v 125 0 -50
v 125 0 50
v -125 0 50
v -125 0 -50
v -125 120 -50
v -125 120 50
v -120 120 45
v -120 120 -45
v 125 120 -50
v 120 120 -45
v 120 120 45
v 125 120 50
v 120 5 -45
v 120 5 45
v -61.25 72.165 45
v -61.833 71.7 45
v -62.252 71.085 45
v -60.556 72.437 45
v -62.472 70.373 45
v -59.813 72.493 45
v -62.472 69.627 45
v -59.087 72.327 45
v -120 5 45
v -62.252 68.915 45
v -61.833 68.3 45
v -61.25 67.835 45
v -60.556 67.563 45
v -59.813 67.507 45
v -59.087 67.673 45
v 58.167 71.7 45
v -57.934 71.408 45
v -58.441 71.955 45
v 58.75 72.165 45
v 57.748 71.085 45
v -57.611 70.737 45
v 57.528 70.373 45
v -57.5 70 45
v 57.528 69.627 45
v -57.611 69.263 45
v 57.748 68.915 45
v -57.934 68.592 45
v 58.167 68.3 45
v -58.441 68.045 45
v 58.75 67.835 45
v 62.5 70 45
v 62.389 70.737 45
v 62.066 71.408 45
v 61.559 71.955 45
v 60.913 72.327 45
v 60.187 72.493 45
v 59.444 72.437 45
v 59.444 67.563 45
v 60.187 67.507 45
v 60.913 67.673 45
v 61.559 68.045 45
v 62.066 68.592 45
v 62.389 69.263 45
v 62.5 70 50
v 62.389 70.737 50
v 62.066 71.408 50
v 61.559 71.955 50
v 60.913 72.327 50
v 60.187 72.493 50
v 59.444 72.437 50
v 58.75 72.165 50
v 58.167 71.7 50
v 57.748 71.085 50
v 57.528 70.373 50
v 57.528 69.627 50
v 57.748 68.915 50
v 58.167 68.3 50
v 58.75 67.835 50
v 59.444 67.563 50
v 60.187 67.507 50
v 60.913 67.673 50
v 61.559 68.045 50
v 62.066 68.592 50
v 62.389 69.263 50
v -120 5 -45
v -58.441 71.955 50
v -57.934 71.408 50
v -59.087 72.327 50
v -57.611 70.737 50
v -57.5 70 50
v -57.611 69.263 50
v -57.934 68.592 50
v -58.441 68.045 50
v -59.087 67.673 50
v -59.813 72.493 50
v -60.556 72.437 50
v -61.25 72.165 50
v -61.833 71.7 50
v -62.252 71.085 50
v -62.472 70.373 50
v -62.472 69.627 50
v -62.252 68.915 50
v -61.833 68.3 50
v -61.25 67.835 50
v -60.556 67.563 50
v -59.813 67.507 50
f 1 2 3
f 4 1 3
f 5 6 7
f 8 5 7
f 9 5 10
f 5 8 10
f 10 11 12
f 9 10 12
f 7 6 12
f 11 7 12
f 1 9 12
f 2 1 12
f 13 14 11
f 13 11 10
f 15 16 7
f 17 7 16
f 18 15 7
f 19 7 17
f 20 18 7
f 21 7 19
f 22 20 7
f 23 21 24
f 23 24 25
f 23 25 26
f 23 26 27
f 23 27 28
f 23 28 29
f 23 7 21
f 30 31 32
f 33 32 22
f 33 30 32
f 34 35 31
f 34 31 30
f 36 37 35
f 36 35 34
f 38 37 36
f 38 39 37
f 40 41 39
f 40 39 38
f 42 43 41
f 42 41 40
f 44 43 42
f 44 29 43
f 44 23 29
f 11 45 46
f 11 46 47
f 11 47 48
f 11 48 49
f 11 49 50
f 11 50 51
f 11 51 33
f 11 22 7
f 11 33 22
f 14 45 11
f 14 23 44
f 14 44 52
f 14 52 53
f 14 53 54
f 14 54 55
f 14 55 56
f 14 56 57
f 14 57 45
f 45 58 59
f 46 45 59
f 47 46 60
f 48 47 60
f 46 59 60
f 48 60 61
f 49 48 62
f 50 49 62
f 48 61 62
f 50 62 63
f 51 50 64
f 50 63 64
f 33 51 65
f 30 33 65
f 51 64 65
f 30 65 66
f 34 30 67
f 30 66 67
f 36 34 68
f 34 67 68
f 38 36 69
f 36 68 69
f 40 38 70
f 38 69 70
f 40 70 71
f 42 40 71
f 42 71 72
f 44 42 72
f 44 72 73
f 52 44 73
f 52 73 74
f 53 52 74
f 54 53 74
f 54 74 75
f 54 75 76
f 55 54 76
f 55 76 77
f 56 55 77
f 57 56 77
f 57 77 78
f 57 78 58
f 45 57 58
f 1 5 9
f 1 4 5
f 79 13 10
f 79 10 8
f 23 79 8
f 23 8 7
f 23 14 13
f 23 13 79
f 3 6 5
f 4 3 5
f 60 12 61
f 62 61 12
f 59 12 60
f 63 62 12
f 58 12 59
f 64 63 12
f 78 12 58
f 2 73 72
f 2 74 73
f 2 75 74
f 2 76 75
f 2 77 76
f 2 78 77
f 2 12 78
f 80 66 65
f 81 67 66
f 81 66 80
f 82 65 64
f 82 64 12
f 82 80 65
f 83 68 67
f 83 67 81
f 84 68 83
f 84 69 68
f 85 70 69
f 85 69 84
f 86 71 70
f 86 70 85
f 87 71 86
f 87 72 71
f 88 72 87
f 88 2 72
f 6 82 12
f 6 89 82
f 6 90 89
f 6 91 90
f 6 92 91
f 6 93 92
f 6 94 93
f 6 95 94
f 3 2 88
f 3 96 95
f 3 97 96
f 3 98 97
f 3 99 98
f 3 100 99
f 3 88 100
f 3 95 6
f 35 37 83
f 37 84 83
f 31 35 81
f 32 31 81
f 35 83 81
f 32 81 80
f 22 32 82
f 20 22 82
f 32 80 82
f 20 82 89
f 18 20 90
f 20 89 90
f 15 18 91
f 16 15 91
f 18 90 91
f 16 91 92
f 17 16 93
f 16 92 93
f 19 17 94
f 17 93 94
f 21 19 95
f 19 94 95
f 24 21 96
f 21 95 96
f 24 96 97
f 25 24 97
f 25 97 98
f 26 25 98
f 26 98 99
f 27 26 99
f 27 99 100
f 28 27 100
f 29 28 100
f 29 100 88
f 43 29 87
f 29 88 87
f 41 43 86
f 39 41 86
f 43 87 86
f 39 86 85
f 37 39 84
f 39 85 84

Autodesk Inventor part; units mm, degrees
ref_plane "YZ Plane" through (0, 0, 0) normal (1, 0, 0) x (0, 1, 0)
ref_plane "XZ Plane" through (0, 0, 0) normal (0, 1, 0) x (-1, 0, 0)
ref_plane "XY Plane" through (0, 0, 0) normal (0, 0, 1) x (1, 0, 0)
sketch "Sketch1" plane through (0, 0, 0) normal (0, 1, 0) x (-1, 0, 0)
  line L0 (125, 50) -> (-125, 50)
  line L1 (-125, 50) -> (-125, -50)
  line L2 (-125, -50) -> (125, -50)
  line L3 (125, -50) -> (125, 50)
  line L4 (120, 45) -> (-120, 45)
  line L5 (-120, 45) -> (-120, -45)
  line L6 (-120, -45) -> (120, -45)
  line L7 (120, -45) -> (120, 45)
  point P0 (0, 0)
  dimension "d0" = 250
  dimension "d1" = 100
  dimension "d2" = 50
  dimension "d3" = 125
  dimension "d4" = 5
  dimension "d5" = 5
  dimension "d6" = 5
  dimension "d7" = 5
extrude "Extrusion1" add sketch "Sketch1" along normal blind 5 contours L7 L6 L5 L4
sketch "Sketch2" plane through (0, 0, 0) normal (0, -1, 0) x (1, 0, 0)
  line L0 (-125, -50) -> (125, -50)
  line L1 (125, -50) -> (125, 50)
  line L2 (125, 50) -> (-125, 50)
  line L3 (-125, 50) -> (-125, -50)
  line L4 (-120, -45) -> (-120, 45) projected
  line L5 (120, 45) -> (120, -45) projected
  line L6 (-120, 45) -> (120, 45) projected
  line L7 (120, -45) -> (-120, -45) projected
  line L8 (-120, -45) -> (-120, 45) projected
  line L9 (120, 45) -> (120, -45) projected
  line L10 (-120, -45) -> (120, -45)
  line L11 (120, -45) -> (120, 45)
  line L12 (120, 45) -> (-120, 45)
  line L13 (-120, 45) -> (-120, -45)
  point P0 (0, 0)
  dimension "d10" = 5
  dimension "d11" = 5
  dimension "d12" = 5
  dimension "d13" = 5
extrude "Extrusion2" add sketch "Sketch2" against normal blind 120
sketch "Sketch4" plane through (-125, 0, 50) normal (0, 0, 1) x (1, 0, 0)
  circle A0 centre (65, 70) radius 2.5
  circle A1 centre (185, 70) radius 2.5
  line L0 (250, 0) -> (0, 0) projected
  line L1 (250, 0) -> (250, 120) projected
  point P0 (125, 0)
  point P1 (250, 60)
  dimension "d16" = 5
  dimension "d17" = 5
  dimension "d18" = 70
  dimension "d19" = 70
  dimension "d20" = 120
  dimension "d21" = 65
extrude "Extrusion3" cut sketch "Sketch4" against normal blind 5
properties part number "Team29_BaseofBox"
